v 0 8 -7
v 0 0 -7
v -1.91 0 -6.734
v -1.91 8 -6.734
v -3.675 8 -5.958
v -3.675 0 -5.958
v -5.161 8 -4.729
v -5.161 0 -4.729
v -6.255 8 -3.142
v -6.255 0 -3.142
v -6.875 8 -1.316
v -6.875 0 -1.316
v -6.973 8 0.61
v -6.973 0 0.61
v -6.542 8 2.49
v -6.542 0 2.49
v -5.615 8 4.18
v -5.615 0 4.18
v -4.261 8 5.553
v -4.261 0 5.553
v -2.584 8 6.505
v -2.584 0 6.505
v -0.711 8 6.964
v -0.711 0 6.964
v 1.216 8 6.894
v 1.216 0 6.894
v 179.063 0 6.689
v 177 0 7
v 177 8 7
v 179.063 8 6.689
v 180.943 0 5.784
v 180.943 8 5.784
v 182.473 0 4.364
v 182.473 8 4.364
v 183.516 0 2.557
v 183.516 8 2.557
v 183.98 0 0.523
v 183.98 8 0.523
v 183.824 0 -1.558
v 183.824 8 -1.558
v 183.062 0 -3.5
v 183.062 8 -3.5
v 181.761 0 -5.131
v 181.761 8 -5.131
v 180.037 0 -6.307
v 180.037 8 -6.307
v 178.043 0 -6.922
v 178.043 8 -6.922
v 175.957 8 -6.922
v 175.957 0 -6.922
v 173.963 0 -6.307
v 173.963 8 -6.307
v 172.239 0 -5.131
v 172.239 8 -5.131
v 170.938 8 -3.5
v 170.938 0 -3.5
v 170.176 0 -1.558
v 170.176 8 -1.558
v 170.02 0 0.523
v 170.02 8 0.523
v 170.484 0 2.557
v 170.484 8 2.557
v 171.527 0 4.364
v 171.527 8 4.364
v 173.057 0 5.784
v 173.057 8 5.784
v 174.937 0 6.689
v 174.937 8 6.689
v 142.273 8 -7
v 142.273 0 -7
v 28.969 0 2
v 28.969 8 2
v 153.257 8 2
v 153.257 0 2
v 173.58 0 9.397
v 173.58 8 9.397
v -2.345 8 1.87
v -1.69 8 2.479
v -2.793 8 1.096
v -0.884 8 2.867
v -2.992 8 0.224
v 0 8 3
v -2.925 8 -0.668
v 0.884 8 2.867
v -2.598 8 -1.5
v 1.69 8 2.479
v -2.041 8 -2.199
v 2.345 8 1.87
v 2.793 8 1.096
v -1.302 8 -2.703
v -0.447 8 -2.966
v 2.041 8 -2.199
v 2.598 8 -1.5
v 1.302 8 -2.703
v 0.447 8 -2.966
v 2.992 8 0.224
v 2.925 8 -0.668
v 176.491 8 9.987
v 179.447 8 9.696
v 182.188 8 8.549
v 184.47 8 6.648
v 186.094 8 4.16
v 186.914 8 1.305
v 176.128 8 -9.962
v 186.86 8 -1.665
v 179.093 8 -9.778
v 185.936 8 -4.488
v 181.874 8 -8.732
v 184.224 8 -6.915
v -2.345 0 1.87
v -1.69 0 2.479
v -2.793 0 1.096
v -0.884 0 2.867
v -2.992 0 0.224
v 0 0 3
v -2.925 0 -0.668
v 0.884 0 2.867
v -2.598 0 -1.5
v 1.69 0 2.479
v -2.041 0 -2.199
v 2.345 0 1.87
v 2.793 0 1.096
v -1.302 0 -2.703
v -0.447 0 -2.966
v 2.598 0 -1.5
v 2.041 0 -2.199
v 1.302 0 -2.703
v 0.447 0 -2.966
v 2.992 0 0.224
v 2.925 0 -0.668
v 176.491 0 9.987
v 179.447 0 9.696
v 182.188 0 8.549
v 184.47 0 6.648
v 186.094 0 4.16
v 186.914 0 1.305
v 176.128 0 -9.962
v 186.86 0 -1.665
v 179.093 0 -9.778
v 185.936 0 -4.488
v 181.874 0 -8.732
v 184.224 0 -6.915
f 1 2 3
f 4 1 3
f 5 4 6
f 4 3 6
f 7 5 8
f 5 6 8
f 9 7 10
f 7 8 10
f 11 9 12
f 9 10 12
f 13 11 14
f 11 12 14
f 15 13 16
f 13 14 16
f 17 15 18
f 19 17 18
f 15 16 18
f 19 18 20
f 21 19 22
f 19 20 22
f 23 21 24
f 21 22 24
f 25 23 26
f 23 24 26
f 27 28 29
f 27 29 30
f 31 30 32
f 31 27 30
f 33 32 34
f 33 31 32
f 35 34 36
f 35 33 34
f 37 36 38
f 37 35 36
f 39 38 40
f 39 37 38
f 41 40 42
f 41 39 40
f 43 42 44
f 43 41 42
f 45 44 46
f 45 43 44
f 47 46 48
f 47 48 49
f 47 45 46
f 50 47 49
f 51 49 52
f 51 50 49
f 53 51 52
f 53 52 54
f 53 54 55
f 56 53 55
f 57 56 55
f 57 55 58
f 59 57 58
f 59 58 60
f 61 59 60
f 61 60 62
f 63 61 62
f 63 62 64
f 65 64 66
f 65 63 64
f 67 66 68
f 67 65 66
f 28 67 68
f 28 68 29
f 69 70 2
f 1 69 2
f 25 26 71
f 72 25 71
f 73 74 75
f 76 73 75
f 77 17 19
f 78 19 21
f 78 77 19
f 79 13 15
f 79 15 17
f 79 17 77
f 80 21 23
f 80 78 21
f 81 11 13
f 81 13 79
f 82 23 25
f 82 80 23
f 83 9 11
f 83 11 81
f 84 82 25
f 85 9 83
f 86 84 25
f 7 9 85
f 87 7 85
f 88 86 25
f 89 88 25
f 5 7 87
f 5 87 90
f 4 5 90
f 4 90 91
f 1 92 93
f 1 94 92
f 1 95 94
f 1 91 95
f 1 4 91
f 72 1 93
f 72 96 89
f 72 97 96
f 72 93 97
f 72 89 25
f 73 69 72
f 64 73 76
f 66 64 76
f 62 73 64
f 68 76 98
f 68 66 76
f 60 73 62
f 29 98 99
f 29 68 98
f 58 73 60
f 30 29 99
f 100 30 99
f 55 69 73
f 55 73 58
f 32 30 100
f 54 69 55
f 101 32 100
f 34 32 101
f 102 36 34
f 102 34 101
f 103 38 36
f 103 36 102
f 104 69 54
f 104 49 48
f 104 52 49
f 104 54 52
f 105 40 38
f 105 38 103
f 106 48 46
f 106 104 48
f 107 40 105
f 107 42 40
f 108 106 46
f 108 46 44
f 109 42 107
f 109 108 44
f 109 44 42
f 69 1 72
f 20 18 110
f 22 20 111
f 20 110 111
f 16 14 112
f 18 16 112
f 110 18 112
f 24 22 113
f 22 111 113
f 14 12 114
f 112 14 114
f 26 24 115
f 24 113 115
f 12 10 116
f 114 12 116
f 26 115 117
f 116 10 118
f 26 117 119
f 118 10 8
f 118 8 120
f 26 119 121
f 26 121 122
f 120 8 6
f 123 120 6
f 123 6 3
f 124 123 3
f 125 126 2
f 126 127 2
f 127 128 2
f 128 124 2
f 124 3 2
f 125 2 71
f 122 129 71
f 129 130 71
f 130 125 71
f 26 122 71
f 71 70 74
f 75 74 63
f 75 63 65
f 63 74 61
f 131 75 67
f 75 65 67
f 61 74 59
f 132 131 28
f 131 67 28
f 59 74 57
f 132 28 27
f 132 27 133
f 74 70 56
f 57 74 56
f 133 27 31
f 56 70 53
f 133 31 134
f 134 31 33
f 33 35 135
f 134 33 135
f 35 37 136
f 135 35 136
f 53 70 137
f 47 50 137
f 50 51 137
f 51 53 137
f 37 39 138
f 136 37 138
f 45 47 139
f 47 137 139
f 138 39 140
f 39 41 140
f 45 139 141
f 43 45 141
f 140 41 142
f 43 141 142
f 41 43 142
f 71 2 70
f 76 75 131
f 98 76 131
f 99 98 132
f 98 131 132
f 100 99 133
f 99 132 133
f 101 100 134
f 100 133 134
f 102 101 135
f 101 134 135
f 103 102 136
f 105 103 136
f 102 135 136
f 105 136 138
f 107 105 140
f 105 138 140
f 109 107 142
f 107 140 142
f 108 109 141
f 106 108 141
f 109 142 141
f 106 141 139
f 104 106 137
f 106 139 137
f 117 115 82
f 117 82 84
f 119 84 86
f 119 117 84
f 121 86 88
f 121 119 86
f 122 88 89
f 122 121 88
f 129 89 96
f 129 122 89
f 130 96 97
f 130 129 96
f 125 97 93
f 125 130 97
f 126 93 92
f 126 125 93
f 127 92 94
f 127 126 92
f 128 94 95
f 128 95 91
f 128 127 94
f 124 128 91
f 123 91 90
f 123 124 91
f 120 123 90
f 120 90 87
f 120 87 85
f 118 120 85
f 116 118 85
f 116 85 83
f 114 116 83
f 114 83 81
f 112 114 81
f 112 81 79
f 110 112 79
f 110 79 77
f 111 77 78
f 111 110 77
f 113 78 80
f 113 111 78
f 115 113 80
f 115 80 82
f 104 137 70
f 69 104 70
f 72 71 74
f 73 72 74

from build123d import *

# Parameters (mm, degrees)
SKETCH_1_R      = 3
SKETCH_1_R_2    = 7
EXTRUDE_2_DEPTH = 8


with BuildPart() as part:
    # 草图1 → 凸台-拉伸2 (new body)
    with BuildSketch(Plane(origin=(0, 0, 0), x_dir=(1, 0, 0), z_dir=(0, 1, 0))):
        with BuildLine():
            ThreePointArc((0, 7), (-6.973362887, -0.610090199), (1.215537244, -6.893654271))
            Line((1.215537244, -6.893654271), (28.968829743, -2))
            Line((28.968829743, -2), (153.256910837, -2))
            Line((153.256910837, -2), (173.579798567, -9.396926208))
            ThreePointArc((173.579798567, -9.396926208), (186.914448614, -1.305261922), (176.128442573, 9.961946981))
            Line((176.128442573, 9.961946981), (142.273233663, 7))
            Line((142.273233663, 7), (0, 7))
        make_face()
        with Locations(Location((0, 0, 0), (0, 0, 270))):
            Circle(SKETCH_1_R, mode=Mode.SUBTRACT)
        with Locations(Location((177, 0, 0), (0, 0, 270))):
            Circle(SKETCH_1_R_2, mode=Mode.SUBTRACT)
    extrude(amount=EXTRUDE_2_DEPTH)


solid = part.part
